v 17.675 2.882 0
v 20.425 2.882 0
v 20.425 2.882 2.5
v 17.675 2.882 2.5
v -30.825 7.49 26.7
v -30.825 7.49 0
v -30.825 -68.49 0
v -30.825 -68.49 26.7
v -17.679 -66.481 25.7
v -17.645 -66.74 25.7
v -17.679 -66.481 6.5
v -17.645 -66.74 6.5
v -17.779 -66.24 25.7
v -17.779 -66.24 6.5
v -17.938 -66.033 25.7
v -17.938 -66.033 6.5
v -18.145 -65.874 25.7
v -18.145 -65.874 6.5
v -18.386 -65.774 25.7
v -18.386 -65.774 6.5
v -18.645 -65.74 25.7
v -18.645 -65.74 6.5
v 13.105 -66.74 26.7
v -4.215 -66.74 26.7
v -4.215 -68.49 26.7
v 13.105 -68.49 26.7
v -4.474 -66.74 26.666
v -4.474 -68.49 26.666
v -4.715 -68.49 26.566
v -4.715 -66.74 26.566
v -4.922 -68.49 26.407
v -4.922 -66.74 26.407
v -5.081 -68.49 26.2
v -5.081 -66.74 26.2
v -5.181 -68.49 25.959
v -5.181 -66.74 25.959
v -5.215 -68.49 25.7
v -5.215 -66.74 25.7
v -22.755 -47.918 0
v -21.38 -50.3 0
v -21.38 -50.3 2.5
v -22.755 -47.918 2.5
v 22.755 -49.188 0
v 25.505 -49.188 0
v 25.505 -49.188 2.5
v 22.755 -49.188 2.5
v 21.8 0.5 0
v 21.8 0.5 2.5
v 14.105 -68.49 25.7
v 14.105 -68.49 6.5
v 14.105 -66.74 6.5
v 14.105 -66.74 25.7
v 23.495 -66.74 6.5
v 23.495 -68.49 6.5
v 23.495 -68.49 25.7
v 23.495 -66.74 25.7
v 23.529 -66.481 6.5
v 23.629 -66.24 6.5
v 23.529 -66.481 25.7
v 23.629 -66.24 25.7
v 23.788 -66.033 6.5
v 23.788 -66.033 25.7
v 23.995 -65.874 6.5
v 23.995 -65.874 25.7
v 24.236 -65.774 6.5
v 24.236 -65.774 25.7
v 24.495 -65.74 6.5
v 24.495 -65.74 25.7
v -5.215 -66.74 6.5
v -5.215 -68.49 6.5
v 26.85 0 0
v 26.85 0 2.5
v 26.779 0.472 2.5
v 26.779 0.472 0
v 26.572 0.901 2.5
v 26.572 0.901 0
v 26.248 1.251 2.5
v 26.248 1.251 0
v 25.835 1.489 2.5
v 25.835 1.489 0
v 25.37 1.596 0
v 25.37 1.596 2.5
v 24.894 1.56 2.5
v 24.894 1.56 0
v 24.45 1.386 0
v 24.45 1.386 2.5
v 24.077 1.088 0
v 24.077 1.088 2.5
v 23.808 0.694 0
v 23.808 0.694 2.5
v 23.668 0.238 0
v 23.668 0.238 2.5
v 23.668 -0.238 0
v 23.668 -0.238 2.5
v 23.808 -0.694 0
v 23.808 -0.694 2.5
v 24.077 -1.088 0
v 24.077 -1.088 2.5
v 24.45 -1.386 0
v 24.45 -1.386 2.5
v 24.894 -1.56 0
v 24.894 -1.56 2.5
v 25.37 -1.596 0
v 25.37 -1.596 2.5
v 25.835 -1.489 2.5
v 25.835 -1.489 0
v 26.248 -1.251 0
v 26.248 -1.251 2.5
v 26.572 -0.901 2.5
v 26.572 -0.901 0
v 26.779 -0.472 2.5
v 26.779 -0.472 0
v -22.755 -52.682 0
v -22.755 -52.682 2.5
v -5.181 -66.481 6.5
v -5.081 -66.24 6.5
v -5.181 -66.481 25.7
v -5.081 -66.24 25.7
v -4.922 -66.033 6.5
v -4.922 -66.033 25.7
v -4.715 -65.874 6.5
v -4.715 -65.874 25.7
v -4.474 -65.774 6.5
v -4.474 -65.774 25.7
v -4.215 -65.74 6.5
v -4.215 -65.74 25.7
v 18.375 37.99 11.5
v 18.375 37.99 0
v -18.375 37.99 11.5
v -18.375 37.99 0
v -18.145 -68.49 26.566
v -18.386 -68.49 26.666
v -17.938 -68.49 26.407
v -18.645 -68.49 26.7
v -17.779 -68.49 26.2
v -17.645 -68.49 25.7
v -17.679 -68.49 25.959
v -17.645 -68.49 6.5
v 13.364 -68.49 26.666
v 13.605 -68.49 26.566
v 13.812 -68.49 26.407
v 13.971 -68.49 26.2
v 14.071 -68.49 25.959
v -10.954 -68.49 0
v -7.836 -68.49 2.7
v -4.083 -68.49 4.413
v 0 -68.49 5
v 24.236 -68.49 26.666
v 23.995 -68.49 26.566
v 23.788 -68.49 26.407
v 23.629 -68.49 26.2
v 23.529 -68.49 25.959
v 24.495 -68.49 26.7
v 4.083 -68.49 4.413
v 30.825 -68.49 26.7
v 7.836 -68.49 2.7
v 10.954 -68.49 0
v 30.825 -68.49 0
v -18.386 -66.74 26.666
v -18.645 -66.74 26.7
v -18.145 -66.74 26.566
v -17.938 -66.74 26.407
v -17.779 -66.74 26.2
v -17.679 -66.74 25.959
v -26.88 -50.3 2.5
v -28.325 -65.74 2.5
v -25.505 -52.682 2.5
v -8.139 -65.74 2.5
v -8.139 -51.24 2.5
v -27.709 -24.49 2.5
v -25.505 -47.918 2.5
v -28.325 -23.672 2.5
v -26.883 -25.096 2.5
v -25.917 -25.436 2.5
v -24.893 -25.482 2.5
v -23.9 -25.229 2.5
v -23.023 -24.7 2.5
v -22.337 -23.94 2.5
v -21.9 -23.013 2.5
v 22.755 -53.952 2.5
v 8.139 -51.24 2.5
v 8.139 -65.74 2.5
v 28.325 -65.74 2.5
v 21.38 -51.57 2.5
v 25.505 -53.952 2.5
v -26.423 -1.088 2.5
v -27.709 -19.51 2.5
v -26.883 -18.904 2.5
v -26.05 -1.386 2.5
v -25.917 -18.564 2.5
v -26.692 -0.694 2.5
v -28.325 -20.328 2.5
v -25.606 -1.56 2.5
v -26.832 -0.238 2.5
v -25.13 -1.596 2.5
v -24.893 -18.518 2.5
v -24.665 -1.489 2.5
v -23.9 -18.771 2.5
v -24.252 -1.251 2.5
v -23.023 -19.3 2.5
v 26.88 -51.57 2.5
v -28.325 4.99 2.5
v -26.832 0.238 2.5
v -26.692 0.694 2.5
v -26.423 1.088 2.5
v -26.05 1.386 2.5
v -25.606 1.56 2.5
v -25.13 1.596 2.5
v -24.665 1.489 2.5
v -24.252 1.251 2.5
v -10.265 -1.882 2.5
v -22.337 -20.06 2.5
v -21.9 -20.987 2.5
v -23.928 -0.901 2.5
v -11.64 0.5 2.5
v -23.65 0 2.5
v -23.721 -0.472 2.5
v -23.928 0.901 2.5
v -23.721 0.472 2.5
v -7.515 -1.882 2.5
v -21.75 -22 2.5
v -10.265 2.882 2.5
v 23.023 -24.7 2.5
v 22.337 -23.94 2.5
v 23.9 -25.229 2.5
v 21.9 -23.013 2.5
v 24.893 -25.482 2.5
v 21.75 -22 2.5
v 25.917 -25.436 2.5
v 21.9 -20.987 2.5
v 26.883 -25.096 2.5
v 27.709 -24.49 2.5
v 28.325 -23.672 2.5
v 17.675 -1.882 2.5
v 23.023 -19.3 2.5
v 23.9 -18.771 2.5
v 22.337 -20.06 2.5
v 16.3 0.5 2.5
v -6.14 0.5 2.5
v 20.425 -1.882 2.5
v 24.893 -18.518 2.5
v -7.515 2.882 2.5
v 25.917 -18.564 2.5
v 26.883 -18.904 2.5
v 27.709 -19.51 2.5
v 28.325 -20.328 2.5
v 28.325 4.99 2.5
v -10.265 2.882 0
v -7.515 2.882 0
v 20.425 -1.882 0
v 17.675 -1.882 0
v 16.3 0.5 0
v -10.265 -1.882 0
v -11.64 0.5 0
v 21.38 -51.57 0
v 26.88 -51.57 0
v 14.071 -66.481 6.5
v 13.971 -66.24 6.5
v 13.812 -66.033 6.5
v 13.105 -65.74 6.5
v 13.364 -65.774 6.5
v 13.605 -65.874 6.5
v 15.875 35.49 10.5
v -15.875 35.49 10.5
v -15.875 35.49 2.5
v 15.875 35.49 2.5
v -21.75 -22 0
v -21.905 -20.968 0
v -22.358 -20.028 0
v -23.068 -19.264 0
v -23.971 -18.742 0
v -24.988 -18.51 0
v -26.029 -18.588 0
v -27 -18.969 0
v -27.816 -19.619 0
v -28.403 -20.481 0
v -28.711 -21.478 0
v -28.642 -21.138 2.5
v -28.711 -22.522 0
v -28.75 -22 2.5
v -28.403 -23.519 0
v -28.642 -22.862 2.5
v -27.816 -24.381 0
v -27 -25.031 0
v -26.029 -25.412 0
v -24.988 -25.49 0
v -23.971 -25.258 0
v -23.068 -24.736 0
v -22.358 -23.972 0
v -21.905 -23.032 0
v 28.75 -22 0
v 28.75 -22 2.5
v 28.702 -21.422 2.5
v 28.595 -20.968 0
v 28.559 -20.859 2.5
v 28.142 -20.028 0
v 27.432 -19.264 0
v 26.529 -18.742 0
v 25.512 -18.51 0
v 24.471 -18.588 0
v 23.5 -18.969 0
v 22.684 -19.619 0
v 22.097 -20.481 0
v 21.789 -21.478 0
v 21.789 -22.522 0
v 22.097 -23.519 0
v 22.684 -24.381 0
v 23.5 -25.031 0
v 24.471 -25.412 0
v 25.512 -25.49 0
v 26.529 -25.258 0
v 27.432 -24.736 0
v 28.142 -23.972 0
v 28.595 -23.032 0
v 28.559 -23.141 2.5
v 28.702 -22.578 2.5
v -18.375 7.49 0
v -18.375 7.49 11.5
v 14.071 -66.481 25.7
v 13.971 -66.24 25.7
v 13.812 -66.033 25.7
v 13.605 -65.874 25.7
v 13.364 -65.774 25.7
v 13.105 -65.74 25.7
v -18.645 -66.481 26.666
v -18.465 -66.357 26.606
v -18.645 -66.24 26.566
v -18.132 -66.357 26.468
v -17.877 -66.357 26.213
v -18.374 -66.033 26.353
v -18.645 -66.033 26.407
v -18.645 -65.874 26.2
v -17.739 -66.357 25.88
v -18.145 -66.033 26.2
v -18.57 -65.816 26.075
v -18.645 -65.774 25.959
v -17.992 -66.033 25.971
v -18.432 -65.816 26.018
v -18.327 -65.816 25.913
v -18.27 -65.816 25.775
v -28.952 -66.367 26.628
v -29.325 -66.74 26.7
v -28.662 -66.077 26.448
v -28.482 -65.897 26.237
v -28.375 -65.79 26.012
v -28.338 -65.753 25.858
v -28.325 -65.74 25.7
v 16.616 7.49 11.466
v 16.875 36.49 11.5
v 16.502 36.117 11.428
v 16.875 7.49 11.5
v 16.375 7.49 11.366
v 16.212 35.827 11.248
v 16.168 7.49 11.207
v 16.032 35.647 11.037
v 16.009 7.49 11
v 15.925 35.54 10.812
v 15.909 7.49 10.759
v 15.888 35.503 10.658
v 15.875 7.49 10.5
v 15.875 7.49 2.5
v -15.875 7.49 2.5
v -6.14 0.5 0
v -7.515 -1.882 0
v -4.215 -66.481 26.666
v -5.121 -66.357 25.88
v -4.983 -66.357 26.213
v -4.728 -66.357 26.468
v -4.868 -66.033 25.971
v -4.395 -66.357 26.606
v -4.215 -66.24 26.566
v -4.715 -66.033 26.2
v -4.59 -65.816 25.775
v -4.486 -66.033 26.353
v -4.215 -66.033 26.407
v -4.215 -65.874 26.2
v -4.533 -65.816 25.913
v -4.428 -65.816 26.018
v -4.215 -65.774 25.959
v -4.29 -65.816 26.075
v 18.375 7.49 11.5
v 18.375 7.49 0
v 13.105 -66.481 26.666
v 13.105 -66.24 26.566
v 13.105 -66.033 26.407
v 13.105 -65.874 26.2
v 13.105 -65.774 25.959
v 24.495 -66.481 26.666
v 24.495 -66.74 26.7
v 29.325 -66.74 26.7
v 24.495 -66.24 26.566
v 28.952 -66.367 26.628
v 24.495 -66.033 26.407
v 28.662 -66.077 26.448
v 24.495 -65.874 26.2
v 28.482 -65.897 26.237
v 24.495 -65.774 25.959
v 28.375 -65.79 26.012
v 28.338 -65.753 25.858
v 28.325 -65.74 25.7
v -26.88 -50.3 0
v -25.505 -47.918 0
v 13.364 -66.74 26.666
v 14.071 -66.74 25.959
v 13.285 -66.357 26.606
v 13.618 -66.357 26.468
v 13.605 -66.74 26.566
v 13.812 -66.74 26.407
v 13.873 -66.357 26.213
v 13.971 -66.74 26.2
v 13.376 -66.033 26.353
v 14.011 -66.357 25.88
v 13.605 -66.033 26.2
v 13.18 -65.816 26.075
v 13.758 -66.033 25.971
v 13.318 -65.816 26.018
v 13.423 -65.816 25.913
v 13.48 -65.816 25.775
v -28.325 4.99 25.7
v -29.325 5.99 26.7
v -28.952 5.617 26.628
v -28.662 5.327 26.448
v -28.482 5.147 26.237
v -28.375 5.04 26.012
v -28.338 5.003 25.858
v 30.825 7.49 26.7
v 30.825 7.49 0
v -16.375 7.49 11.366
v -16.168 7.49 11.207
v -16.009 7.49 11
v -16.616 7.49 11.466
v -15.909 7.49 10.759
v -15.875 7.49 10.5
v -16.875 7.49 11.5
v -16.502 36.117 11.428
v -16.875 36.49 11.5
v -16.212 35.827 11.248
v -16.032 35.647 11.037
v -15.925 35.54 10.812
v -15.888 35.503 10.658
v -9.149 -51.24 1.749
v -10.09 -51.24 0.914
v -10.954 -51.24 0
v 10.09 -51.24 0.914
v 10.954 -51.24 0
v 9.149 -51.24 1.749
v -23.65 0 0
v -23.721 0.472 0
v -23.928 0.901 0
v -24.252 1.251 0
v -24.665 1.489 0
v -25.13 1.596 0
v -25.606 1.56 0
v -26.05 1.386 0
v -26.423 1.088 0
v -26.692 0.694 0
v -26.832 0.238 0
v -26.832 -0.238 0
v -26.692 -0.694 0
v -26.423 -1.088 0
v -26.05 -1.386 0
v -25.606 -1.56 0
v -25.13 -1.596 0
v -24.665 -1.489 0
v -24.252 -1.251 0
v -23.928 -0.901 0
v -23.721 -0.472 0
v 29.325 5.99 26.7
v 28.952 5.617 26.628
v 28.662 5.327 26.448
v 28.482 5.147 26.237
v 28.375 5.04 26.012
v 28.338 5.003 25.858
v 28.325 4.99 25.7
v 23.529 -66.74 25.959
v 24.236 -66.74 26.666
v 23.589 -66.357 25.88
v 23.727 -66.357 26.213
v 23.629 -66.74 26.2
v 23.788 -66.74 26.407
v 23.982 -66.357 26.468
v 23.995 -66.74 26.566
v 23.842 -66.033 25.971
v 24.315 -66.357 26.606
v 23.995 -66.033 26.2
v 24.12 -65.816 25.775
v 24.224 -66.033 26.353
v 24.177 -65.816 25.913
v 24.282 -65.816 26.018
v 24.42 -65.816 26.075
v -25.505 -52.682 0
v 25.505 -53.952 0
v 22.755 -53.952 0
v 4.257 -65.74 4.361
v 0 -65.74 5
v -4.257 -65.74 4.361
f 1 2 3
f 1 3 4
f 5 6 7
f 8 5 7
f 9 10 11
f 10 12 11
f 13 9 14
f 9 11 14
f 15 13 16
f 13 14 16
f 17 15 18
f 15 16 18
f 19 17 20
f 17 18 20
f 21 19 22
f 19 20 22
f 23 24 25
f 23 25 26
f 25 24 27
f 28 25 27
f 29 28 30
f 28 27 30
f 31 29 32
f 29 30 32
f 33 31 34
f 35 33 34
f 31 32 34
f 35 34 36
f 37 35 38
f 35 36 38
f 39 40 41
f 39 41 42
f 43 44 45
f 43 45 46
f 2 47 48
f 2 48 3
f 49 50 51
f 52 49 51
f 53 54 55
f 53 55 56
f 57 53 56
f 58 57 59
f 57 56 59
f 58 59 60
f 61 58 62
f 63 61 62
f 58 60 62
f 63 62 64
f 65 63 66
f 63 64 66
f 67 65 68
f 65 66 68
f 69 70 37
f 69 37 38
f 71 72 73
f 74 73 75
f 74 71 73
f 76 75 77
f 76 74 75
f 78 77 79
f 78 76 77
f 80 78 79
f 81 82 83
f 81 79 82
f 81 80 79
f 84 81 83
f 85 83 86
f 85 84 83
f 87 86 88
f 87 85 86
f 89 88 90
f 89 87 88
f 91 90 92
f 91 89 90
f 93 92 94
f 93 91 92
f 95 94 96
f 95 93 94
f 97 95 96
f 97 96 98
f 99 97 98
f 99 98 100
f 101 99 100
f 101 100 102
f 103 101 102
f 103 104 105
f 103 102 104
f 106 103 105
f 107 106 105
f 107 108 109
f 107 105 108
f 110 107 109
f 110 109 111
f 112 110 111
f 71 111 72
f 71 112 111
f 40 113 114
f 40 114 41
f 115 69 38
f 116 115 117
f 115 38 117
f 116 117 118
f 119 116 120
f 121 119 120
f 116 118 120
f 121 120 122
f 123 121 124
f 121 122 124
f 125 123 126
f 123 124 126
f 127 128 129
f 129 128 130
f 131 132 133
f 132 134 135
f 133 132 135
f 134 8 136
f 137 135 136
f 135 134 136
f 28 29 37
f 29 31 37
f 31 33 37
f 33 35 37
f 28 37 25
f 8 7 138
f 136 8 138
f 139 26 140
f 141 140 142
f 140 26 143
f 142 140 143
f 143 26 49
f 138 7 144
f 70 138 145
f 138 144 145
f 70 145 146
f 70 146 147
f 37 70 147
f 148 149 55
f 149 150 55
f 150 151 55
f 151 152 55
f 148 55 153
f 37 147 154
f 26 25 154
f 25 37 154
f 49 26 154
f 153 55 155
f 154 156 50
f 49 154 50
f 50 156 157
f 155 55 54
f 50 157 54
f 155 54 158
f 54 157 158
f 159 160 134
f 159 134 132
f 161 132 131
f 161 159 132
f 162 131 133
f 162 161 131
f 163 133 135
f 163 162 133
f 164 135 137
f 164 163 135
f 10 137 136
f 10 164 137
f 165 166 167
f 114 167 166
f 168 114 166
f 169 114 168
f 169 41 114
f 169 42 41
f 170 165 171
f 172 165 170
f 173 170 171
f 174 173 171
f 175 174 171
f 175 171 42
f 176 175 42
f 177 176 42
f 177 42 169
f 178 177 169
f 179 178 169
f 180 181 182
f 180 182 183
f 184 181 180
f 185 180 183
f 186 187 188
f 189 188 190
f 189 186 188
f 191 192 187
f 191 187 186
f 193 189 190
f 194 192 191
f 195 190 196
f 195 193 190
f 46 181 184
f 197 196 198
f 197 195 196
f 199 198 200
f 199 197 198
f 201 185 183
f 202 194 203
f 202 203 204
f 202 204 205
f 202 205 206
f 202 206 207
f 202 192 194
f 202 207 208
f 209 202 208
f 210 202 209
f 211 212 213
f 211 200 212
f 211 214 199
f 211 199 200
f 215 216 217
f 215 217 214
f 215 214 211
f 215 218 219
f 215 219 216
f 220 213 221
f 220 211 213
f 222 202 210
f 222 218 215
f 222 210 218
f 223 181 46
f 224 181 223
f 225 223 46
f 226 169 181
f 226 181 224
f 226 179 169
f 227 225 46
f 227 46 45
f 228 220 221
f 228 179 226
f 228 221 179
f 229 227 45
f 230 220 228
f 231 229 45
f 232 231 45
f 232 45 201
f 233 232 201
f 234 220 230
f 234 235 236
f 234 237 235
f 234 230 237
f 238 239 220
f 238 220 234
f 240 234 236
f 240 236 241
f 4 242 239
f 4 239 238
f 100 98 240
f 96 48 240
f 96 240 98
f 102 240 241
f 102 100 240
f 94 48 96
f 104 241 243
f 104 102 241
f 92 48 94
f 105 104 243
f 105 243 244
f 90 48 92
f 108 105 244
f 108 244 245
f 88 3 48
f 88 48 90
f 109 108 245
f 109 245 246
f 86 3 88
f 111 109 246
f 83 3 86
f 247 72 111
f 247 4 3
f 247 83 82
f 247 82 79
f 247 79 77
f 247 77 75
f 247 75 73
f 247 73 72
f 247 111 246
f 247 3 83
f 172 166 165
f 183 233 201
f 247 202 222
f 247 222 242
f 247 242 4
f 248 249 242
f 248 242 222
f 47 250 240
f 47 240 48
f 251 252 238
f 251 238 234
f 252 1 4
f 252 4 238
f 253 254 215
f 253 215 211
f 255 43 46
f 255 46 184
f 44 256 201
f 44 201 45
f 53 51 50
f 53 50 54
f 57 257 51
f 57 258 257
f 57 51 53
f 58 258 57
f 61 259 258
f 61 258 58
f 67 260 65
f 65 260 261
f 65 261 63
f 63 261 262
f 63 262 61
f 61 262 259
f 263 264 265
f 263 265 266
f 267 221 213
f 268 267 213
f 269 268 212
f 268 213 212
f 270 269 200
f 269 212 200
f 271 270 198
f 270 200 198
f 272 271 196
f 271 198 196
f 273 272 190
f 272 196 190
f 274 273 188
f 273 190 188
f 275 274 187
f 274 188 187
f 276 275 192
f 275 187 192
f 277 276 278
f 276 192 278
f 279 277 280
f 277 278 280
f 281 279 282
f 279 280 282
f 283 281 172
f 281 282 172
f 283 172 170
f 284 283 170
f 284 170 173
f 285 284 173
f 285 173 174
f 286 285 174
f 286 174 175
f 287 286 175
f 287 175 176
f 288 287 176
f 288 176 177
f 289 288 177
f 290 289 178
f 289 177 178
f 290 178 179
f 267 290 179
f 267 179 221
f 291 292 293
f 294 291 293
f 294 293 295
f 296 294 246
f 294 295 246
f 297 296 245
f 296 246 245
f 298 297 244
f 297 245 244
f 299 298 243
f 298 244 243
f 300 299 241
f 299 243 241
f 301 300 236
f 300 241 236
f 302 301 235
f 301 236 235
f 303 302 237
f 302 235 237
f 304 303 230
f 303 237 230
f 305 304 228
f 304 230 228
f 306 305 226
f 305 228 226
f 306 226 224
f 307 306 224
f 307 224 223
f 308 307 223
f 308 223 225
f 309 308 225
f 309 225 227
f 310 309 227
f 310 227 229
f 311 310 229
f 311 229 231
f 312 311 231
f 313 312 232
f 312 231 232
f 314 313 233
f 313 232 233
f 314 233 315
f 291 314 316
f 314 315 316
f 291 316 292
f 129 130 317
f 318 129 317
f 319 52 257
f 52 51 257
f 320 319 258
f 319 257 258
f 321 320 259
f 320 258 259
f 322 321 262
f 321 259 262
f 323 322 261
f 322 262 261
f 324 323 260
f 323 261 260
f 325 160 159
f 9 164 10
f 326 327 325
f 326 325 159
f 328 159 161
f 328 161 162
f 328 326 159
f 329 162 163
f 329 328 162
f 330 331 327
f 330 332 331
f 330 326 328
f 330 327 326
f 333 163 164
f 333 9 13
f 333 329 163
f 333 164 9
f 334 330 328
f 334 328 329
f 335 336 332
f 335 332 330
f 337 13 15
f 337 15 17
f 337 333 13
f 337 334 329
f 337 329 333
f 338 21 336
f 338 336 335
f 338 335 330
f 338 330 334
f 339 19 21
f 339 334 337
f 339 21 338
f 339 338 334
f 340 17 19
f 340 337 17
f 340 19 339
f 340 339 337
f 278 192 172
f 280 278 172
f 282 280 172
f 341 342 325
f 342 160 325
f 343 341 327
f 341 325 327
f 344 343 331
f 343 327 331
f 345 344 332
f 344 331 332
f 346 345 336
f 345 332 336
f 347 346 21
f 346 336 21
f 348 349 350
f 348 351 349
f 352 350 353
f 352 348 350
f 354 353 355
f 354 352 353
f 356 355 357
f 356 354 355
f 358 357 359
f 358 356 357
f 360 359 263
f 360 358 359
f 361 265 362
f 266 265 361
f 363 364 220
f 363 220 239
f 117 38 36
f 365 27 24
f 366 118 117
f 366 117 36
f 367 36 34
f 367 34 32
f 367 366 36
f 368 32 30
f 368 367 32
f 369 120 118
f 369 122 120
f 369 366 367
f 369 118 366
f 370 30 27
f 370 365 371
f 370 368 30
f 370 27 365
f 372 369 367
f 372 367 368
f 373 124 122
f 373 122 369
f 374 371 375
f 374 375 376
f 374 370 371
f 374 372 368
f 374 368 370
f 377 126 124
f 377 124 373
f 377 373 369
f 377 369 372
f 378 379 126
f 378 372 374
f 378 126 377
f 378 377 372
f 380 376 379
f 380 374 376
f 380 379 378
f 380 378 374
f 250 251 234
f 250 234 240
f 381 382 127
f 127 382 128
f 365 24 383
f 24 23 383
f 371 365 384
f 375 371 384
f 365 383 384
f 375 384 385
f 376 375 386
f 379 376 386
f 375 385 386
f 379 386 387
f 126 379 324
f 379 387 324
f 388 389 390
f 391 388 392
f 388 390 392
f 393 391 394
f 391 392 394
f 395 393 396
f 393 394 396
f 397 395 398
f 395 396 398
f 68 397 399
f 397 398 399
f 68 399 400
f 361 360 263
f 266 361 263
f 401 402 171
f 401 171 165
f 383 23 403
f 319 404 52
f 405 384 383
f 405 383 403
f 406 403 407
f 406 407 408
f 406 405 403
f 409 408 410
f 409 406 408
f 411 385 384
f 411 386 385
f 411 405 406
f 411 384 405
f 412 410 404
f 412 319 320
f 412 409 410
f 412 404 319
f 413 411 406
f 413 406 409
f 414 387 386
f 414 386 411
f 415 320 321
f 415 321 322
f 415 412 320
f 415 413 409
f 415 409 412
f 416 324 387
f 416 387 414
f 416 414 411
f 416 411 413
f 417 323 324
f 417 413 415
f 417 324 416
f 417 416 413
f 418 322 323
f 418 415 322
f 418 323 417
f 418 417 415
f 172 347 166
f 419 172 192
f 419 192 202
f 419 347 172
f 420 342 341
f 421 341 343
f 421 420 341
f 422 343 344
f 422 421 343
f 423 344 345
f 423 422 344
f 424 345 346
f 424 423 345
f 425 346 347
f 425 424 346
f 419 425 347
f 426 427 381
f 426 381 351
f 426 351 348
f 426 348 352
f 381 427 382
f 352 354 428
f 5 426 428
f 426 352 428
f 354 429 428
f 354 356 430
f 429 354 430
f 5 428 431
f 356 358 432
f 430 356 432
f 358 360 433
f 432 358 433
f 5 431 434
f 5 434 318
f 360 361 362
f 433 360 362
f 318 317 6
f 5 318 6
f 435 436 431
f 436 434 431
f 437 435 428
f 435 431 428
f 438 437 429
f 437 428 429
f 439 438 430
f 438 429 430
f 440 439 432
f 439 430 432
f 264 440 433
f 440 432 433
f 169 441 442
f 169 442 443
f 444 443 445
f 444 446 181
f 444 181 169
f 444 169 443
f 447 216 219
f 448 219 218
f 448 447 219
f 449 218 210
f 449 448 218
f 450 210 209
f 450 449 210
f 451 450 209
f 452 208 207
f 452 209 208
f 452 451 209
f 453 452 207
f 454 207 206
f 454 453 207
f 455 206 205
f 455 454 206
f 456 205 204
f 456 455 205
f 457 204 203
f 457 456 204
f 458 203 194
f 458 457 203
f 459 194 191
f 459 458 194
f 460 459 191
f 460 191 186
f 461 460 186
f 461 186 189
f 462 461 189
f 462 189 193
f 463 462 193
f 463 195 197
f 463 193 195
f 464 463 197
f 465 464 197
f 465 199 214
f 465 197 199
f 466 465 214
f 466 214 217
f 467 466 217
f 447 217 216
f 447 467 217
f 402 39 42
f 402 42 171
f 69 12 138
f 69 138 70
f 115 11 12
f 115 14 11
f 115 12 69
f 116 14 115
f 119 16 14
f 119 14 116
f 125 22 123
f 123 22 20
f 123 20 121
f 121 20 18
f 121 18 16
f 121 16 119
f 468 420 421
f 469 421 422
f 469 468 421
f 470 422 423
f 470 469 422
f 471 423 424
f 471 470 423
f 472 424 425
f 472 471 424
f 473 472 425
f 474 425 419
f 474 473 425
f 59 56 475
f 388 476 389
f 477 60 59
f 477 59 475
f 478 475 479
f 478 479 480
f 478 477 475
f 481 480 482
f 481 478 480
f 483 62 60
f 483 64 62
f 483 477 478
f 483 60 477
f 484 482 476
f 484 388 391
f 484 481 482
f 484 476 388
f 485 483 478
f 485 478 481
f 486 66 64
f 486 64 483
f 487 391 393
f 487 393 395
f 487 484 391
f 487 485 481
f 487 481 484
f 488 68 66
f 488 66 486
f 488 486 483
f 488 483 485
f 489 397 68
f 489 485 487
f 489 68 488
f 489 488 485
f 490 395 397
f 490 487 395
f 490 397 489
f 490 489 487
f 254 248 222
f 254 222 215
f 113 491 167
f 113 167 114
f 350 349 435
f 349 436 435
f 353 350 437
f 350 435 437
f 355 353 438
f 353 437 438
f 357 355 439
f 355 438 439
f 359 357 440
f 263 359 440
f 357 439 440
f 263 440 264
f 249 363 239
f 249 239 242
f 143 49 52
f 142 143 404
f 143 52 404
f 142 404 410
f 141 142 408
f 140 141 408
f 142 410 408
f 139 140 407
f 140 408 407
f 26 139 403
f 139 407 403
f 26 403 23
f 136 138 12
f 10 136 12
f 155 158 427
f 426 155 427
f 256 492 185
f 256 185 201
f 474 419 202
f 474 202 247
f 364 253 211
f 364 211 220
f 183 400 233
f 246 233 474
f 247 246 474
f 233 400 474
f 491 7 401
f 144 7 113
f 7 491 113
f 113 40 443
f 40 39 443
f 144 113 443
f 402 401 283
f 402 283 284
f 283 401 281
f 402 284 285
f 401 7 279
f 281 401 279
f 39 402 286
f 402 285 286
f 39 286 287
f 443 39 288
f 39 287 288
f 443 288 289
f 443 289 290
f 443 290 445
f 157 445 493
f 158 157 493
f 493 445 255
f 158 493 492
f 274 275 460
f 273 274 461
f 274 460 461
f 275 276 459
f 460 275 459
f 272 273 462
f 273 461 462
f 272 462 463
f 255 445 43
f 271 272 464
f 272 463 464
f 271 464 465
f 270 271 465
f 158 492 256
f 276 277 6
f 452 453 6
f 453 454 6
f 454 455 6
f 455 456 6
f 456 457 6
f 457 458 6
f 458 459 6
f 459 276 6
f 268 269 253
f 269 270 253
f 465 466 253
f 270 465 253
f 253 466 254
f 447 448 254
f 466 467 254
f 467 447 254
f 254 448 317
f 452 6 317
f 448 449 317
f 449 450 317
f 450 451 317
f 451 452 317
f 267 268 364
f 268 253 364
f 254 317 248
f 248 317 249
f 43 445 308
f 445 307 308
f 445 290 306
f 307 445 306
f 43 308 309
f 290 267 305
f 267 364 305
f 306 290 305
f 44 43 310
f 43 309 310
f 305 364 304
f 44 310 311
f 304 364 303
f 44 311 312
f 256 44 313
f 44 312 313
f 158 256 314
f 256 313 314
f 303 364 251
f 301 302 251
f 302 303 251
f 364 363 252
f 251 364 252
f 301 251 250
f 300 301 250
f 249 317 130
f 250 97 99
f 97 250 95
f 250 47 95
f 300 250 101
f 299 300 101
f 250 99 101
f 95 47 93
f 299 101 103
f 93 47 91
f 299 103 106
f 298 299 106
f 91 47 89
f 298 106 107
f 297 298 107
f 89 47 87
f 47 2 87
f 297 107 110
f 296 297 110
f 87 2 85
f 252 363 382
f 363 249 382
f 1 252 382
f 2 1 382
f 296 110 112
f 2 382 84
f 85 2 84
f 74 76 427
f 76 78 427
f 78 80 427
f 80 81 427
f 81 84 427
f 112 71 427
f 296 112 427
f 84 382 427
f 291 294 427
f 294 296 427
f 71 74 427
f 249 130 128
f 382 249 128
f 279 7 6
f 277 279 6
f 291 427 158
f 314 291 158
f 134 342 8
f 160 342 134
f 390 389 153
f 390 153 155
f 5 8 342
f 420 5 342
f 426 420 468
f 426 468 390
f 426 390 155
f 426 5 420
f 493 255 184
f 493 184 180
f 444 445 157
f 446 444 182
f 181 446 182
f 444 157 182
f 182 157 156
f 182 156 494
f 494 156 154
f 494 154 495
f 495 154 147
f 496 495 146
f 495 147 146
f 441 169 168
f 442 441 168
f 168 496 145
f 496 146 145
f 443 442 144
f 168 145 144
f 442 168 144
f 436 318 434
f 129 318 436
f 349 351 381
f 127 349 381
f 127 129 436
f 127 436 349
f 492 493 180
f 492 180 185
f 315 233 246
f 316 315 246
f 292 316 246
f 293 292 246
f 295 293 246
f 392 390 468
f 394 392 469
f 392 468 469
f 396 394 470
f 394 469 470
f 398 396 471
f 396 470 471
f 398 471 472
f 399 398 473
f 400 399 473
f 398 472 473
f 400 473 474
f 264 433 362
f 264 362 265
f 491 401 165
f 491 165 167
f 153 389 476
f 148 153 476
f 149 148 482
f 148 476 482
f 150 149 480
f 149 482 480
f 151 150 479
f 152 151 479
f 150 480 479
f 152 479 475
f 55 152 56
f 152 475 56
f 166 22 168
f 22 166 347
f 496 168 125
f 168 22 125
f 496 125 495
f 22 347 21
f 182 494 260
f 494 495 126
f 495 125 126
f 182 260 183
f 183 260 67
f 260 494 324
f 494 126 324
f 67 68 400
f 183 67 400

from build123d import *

# Parameters (mm, degrees)
SKETCH_R        = 1.6
PAD_DEPTH       = 26.7
SKETCH001_W     = 56.65
SKETCH001_H     = 70.73
SKETCH001_W_2   = 31.75
SKETCH001_H_2   = 28
POCKET_DEPTH    = 24.2
SKETCH002_W     = 36.75
SKETCH002_H     = 30.5
POCKET001_DEPTH = 15.2
SKETCH003_W     = 12.43
SKETCH003_H     = 2.95
SKETCH003_W_2   = 9.39
POCKET002_DEPTH = 20.2
SKETCH004_R     = 14.5
POCKET003_DEPTH = 17.25
SKETCH005_R     = 3.5
POCKET004_DEPTH = 2.5
FILLET_R        = 1
FILLET001_R     = 1


with BuildPart() as part:
    # Sketch → Pad (new body)
    with BuildSketch(Plane.XY):
        Polygon((-30.825, -68.49), (30.825, -68.49), (30.825, 7.49), (18.375, 7.49), (18.375, 37.99), (-18.375, 37.99), (-18.375, 7.49), (-30.825, 7.49), align=None)
        with Locations((-25.25, 0)):
            Circle(SKETCH_R, mode=Mode.SUBTRACT)
        with Locations((25.25, 0)):
            Circle(SKETCH_R, mode=Mode.SUBTRACT)
        Polygon((26.88, -51.57), (25.505, -49.18843), (22.755, -49.18843), (21.38, -51.57), (22.755, -53.95157), (25.505, -53.95157), align=None, mode=Mode.SUBTRACT)
        Polygon((-6.14, 0.5), (-7.515, 2.88157), (-10.265, 2.88157), (-11.64, 0.5), (-10.265, -1.88157), (-7.515, -1.88157), align=None, mode=Mode.SUBTRACT)
        Polygon((20.425, -1.88157), (21.8, 0.5), (20.425, 2.88157), (17.675, 2.88157), (16.3, 0.5), (17.675, -1.88157), align=None, mode=Mode.SUBTRACT)
        Polygon((-22.755, -52.68157), (-21.38, -50.3), (-22.755, -47.91843), (-25.505, -47.91843), (-26.88, -50.3), (-25.505, -52.68157), align=None, mode=Mode.SUBTRACT)
    extrude(amount=PAD_DEPTH)

    # Sketch001 (on Face36 of Pad) → Pocket (cut)
    with BuildSketch(Plane.XY.offset(26.7)):
        with Locations((0, -30.375)):
            Rectangle(SKETCH001_W, SKETCH001_H)
        with Locations((0, 21.49)):
            Rectangle(SKETCH001_W_2, SKETCH001_H_2)
    extrude(amount=-POCKET_DEPTH, mode=Mode.SUBTRACT)

    # Sketch002 (on Face5 of Pocket) → Pocket001 (cut)
    with BuildSketch(Plane.XY.offset(26.7)):
        with Locations((0, 22.74)):
            Rectangle(SKETCH002_W, SKETCH002_H)
    extrude(amount=-POCKET001_DEPTH, mode=Mode.SUBTRACT)

    # Sketch003 (on Face5 of Pocket001) → Pocket002 (cut)
    with BuildSketch(Plane.XY.offset(26.7)):
        with Locations((-11.43, -67.015)):
            Rectangle(SKETCH003_W, SKETCH003_H)
        with Locations((18.8, -67.015)):
            Rectangle(SKETCH003_W_2, SKETCH003_H)
    extrude(amount=-POCKET002_DEPTH, mode=Mode.SUBTRACT)

    # Sketch004 (on Face1 of Pocket002) → Pocket003 (cut)
    with BuildSketch(Plane.XZ.offset(68.49)):
        with Locations((0, -9.5)):
            Circle(SKETCH004_R)
    extrude(amount=-POCKET003_DEPTH, mode=Mode.SUBTRACT)

    # Sketch005 (on Face46 of Pocket003) → Pocket004 (cut)
    with BuildSketch(Plane.XY.offset(2.5)):
        with Locations((25.25, -22)):
            Circle(SKETCH005_R)
        with Locations((-25.25, -22)):
            Circle(SKETCH005_R)
    extrude(amount=-POCKET004_DEPTH, mode=Mode.SUBTRACT)

    # Fillet
    fillet_edges = [part.edges().sort_by_distance(p)[0] for p in [
        (15.875, 21.49, 11.5),
        (0, 35.49, 11.5),
        (-15.875, 21.49, 11.5),
        (-17.645, -67.115, 26.7),
        (-5.215, -67.115, 26.7),
        (14.105, -67.115, 26.7),
        (23.495, -67.115, 26.7),
    ]]
    fillet(fillet_edges, radius=FILLET_R)

    # Fillet001
    fillet001_edges = [part.edges().sort_by_distance(p)[0] for p in [
        (-28.325, -30.375, 26.7),
        (-23.485, -65.74, 26.7),
        (4.445, -65.74, 26.7),
        (28.325, -30.375, 26.7),
        (26.41, -65.74, 26.7),
        (0, 4.99, 26.7),
    ]]
    fillet(fillet001_edges, radius=FILLET001_R)


solid = part.part
